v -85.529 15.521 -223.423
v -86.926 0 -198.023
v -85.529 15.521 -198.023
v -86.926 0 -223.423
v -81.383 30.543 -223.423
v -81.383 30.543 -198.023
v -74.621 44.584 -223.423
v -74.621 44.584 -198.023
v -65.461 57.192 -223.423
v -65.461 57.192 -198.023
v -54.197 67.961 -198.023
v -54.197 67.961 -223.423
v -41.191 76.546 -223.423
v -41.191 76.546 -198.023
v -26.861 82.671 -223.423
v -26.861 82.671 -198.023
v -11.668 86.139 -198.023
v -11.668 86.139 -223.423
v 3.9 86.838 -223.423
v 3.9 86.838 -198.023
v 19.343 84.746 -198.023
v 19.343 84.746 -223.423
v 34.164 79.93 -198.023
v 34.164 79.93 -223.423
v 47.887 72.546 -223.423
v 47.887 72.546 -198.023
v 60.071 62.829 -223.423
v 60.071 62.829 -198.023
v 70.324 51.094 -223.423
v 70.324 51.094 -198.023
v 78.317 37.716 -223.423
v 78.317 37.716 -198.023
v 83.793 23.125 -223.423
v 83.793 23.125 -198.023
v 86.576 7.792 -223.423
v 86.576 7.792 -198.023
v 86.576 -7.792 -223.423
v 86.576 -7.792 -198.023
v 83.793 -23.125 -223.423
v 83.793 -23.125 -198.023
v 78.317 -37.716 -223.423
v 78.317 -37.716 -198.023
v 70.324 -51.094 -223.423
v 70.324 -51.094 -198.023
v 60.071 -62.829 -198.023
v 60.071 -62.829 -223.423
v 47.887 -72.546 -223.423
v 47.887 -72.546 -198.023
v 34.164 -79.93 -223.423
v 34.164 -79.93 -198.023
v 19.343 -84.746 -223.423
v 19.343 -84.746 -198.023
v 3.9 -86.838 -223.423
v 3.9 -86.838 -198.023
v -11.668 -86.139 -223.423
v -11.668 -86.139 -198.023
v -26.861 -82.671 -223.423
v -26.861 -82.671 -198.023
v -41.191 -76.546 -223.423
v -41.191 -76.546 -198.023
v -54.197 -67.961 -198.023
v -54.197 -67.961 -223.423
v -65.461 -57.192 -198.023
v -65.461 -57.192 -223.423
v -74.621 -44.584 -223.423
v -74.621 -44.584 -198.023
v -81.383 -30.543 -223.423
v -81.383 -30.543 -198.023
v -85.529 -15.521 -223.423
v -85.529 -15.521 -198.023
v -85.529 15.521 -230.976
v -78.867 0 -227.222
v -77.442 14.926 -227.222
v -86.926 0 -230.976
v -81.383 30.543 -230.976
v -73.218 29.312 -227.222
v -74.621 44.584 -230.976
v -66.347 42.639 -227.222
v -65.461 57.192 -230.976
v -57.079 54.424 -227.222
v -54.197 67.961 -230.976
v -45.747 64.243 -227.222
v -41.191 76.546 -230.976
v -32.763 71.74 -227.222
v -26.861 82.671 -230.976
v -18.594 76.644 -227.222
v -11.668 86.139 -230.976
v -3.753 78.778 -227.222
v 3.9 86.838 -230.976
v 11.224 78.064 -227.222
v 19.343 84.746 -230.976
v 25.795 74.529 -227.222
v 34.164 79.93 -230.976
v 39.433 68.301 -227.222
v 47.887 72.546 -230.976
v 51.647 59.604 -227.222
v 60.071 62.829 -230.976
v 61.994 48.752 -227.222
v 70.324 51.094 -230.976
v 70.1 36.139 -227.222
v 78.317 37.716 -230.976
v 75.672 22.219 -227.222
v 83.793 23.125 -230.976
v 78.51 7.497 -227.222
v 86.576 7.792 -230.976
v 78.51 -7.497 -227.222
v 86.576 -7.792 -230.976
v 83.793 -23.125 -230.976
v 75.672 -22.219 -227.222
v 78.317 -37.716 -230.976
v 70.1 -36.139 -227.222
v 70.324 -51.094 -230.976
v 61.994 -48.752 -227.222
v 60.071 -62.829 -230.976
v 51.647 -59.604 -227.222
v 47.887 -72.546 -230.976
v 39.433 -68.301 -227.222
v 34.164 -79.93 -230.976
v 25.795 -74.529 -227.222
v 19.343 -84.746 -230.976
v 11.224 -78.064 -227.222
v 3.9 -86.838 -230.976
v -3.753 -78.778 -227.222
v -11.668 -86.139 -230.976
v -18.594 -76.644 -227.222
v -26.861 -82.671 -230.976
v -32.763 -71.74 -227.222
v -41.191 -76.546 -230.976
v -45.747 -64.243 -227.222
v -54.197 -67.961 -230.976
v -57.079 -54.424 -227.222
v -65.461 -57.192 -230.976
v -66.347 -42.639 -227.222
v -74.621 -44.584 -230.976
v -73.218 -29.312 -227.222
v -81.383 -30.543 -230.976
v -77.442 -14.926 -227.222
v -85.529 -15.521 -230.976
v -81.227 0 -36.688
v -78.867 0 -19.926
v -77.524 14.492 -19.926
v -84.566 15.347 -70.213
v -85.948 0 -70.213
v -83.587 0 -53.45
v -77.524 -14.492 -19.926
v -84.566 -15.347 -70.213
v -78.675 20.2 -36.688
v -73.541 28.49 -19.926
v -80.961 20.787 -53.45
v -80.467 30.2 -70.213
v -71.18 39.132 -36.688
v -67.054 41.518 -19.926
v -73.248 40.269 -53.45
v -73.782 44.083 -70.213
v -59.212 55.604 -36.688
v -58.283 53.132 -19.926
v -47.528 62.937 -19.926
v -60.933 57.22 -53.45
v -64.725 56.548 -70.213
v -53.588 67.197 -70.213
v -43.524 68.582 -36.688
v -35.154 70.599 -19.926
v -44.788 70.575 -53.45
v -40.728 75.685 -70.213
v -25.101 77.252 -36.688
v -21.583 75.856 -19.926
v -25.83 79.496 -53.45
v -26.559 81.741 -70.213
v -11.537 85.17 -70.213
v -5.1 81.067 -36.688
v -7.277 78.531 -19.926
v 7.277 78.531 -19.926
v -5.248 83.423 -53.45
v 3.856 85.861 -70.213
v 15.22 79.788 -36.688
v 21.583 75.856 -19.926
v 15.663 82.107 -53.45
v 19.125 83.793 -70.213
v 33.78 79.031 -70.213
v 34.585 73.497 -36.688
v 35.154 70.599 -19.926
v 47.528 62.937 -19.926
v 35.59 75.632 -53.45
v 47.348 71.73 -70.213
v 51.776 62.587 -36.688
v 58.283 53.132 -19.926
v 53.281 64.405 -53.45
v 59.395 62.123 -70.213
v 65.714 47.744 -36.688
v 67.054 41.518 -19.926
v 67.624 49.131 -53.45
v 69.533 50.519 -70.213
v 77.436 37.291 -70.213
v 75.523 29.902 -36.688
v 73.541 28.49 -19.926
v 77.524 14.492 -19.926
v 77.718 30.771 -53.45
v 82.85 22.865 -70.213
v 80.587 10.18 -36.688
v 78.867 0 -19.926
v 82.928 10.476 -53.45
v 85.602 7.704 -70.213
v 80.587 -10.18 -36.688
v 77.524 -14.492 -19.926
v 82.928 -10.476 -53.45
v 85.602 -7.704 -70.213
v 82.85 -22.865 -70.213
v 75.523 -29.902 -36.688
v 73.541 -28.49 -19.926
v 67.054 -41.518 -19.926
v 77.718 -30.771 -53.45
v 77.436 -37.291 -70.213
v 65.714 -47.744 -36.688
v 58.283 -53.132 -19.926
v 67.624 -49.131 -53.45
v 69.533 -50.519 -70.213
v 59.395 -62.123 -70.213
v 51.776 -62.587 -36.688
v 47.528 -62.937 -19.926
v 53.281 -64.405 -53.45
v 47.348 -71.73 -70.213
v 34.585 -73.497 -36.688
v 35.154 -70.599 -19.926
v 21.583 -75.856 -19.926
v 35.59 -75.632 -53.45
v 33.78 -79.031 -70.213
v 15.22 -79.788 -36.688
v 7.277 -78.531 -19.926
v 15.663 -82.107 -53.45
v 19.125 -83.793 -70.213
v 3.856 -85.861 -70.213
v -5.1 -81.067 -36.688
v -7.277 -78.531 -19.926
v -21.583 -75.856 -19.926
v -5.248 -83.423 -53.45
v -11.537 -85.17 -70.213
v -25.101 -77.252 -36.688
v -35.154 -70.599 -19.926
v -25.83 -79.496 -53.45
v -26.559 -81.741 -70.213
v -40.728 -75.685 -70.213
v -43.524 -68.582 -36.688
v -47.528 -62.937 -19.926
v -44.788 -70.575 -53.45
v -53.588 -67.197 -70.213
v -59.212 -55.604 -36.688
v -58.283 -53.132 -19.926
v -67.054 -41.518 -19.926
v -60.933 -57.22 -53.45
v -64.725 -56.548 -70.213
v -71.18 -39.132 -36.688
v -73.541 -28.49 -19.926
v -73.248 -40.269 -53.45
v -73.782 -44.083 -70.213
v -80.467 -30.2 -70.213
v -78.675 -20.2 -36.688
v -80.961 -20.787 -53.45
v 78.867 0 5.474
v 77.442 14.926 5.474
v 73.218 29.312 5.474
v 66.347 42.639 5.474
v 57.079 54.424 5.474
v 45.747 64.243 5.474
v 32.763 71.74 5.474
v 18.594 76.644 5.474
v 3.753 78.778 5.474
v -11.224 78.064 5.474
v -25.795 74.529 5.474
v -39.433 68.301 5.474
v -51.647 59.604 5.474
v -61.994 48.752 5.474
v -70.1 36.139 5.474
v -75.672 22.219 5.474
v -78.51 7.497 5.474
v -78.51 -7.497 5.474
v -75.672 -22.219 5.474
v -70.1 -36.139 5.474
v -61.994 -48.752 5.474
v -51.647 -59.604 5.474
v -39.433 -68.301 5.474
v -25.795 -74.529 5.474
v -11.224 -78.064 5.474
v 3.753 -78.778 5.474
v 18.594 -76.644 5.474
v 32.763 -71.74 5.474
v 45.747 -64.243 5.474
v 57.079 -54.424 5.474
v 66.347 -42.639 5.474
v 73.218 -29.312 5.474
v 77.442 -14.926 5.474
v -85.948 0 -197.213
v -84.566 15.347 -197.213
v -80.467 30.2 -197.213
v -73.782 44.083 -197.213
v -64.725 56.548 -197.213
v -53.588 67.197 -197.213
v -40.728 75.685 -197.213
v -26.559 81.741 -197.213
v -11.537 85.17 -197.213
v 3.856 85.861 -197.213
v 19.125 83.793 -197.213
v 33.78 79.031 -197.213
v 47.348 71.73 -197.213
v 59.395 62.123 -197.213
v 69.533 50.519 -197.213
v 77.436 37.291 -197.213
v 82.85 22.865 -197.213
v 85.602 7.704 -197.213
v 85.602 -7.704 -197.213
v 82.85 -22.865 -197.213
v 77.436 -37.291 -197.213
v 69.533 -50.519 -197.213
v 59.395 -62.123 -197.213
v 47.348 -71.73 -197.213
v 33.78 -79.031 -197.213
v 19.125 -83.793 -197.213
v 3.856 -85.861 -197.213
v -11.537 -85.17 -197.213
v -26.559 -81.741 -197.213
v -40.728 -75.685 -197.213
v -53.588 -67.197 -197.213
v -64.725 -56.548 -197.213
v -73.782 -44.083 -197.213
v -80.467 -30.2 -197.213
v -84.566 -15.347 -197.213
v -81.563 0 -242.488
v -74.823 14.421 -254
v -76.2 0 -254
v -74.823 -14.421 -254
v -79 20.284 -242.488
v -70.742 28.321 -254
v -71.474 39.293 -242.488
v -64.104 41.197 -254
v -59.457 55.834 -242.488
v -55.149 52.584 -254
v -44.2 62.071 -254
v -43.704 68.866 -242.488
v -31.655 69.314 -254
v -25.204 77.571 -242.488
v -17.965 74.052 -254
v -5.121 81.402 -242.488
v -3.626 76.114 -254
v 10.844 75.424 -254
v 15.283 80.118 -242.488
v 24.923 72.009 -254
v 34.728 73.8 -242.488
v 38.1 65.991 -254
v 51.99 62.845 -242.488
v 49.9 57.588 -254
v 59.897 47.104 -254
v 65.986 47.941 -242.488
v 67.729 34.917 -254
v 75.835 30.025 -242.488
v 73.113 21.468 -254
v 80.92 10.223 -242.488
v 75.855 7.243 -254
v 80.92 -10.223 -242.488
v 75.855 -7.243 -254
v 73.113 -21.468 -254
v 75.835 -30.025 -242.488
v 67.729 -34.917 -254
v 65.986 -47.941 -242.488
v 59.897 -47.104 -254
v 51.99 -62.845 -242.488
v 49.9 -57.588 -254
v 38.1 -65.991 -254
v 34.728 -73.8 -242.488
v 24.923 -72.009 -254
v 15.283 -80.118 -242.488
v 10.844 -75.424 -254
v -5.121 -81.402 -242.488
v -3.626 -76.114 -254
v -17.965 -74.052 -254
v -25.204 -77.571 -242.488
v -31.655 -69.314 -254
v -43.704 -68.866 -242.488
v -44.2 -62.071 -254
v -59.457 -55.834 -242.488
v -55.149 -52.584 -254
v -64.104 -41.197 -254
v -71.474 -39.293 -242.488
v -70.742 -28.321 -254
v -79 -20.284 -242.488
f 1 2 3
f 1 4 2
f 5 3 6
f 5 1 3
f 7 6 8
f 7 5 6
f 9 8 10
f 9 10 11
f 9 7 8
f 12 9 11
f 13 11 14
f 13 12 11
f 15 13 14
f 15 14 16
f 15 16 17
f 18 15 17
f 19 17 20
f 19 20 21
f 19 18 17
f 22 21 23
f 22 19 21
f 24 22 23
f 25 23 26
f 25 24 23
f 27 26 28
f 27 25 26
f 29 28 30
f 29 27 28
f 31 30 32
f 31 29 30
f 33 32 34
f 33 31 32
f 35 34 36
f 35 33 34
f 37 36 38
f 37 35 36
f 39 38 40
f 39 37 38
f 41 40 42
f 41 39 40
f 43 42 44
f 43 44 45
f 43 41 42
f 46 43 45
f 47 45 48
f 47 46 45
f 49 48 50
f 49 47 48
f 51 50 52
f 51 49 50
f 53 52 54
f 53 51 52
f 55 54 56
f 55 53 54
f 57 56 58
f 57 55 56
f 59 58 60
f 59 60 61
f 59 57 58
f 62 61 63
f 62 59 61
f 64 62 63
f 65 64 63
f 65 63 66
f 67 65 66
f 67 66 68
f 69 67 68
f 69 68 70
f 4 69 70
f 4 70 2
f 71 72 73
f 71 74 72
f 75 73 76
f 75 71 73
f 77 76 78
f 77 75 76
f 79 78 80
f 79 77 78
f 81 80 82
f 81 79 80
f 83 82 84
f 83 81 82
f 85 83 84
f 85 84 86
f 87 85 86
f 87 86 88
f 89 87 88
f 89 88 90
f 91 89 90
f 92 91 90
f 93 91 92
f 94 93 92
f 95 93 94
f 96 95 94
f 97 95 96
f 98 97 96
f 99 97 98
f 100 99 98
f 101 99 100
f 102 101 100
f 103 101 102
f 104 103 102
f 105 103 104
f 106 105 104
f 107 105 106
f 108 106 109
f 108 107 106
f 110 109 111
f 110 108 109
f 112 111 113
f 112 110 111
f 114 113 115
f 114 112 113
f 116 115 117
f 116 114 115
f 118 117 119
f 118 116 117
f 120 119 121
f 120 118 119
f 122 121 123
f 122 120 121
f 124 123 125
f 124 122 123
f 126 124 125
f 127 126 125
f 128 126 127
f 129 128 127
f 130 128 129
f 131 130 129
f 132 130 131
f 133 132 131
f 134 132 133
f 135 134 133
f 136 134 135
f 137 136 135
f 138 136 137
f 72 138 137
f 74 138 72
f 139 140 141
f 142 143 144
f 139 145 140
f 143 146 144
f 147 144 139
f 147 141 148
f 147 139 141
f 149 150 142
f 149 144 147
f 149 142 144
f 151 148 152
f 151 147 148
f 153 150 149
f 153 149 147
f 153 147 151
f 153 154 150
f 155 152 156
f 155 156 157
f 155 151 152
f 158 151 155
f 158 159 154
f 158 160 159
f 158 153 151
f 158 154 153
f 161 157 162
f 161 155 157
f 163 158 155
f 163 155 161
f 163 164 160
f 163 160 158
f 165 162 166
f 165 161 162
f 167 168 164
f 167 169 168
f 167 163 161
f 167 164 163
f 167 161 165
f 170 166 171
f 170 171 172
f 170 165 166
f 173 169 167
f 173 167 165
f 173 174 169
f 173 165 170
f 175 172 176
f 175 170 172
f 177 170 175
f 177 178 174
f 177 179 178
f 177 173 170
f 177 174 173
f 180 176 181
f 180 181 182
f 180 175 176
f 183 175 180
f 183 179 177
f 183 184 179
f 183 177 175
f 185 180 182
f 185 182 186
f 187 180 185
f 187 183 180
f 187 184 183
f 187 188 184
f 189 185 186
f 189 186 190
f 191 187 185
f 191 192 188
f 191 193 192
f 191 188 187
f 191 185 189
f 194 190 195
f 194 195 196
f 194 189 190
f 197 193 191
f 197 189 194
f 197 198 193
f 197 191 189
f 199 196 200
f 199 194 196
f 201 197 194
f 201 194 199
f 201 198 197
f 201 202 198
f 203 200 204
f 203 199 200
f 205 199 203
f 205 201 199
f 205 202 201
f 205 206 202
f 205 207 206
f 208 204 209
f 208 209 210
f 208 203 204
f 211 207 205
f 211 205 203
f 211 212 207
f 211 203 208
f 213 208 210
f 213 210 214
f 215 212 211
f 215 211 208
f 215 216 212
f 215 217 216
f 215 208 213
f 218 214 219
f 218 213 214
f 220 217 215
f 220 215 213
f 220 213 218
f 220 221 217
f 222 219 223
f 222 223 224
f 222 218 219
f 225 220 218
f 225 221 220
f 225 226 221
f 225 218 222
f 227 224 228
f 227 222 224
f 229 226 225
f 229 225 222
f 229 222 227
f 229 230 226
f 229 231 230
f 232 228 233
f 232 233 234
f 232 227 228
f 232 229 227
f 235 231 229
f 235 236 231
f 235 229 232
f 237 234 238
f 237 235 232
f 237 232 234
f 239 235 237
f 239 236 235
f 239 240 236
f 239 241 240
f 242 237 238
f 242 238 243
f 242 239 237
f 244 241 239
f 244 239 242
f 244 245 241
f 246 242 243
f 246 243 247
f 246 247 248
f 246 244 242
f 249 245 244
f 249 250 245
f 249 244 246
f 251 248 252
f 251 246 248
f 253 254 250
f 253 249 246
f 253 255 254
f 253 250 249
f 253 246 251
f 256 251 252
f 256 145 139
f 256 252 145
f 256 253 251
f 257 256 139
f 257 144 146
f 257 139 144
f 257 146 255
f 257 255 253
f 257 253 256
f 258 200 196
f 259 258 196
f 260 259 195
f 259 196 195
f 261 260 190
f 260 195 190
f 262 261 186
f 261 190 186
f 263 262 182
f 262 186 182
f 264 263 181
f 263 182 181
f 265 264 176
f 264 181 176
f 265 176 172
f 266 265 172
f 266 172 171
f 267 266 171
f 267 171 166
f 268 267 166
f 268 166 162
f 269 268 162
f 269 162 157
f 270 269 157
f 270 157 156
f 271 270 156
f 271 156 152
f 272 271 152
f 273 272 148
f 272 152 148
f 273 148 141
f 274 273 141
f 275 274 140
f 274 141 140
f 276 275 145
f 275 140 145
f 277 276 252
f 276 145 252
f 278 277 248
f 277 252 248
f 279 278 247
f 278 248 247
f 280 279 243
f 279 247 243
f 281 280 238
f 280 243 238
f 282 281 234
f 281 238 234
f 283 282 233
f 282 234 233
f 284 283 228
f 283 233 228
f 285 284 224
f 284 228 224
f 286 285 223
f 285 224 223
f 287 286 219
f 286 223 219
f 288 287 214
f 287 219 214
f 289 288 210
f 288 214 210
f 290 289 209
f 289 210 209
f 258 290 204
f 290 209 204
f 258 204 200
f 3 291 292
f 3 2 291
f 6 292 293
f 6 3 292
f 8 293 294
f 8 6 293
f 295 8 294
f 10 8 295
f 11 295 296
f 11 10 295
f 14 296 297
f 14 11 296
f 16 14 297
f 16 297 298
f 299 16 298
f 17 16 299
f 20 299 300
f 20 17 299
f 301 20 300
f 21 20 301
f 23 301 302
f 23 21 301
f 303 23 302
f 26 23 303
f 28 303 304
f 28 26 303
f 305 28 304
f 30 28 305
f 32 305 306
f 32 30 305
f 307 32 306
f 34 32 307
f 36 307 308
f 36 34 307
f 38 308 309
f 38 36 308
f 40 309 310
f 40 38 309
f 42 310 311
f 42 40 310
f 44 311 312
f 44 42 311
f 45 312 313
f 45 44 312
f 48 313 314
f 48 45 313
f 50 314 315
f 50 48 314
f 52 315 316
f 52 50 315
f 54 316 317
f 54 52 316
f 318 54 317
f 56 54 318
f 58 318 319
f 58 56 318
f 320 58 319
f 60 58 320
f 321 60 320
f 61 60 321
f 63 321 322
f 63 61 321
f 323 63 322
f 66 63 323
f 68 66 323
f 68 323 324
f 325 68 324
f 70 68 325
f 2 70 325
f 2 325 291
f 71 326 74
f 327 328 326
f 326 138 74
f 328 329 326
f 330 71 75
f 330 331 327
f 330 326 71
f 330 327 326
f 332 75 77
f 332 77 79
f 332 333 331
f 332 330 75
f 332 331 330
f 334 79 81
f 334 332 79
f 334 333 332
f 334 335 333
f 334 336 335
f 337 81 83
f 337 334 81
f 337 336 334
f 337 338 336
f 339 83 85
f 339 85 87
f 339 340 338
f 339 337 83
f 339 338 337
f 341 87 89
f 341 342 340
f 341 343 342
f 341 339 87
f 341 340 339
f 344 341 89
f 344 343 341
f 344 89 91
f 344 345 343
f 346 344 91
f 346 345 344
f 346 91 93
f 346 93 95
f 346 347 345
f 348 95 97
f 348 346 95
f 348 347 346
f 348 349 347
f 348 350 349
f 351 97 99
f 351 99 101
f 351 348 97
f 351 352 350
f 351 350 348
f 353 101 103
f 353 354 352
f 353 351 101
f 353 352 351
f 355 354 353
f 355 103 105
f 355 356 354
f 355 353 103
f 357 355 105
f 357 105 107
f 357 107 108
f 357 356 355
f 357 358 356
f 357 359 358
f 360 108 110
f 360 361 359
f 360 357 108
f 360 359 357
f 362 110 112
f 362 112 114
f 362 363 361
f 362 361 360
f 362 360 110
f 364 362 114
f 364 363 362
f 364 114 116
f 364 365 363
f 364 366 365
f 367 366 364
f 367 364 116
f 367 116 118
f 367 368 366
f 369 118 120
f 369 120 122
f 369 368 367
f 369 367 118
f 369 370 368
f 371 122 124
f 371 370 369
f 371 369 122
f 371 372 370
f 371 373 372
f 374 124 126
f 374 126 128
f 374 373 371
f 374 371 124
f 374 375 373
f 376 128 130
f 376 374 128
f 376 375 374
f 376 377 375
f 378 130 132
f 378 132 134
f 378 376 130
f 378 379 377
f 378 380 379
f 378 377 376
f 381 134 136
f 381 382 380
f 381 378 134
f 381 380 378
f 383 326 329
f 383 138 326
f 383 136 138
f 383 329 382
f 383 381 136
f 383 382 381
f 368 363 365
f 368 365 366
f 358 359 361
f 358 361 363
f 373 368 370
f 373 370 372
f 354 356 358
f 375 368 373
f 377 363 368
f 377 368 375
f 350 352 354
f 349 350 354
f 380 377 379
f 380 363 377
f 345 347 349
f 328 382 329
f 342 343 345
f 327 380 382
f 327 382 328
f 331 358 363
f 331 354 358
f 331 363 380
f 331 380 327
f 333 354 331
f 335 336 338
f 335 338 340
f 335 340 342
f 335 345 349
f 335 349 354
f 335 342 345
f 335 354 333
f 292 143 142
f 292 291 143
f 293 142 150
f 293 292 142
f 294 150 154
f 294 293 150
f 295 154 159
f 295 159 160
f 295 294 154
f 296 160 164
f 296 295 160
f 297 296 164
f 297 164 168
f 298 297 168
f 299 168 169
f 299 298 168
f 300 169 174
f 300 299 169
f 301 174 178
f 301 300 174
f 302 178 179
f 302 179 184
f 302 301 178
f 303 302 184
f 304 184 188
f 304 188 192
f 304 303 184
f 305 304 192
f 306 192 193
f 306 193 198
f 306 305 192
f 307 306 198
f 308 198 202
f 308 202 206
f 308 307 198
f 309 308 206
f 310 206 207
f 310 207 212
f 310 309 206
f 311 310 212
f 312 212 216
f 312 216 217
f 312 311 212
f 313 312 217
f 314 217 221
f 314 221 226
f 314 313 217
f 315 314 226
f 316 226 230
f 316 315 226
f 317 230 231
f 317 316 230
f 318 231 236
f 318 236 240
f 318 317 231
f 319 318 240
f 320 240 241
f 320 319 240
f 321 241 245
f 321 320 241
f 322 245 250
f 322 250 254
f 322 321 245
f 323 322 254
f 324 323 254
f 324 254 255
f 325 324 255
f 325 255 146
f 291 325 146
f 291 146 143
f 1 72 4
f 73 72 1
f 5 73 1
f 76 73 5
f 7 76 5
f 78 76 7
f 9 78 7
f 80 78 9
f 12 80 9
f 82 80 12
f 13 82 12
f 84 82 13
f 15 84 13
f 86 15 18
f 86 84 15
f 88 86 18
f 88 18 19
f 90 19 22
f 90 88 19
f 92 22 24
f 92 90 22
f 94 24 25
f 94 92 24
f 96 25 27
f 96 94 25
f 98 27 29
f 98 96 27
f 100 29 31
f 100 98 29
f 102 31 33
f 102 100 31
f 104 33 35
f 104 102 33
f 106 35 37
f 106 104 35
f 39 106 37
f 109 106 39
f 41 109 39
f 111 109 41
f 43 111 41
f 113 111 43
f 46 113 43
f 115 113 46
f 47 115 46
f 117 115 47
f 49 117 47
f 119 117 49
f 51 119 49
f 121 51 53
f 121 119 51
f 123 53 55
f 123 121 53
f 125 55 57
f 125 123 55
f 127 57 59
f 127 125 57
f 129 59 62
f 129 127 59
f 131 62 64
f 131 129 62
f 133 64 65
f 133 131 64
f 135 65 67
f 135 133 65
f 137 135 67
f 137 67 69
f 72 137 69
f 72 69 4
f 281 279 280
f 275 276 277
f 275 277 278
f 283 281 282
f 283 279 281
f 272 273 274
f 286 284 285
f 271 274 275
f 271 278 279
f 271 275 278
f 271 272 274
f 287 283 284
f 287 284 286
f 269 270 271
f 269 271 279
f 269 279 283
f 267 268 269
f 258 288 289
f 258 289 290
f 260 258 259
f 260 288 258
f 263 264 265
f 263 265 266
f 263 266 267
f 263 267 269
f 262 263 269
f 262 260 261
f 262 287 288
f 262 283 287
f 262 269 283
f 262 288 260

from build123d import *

# Parameters (mm, degrees)
F1_FACE_R = 78.866989
F2_DEPTH  = 25.4


with BuildPart() as f1:
    # F0 (on Front) → F1 (revolve)
    with BuildSketch(Plane.XZ):
        Polygon((0, -254), (0, -19.925557), (-78.866989, -19.925557), (-85.947688, -70.212811), (-85.947688, -197.212811), (-86.925529, -198.023198), (-86.925529, -223.423198), (-78.866989, -227.221664), (-86.925529, -230.975599), (-76.2, -254), align=None)
    revolve(axis=Axis((0, 0, -127), (0, 0, -1)))

    # F1_face (on face) → F2 (join)
    with BuildSketch(Plane.XY.offset(-19.925557)):
        Circle(F1_FACE_R)
    extrude(amount=F2_DEPTH)


solid = f1.part
